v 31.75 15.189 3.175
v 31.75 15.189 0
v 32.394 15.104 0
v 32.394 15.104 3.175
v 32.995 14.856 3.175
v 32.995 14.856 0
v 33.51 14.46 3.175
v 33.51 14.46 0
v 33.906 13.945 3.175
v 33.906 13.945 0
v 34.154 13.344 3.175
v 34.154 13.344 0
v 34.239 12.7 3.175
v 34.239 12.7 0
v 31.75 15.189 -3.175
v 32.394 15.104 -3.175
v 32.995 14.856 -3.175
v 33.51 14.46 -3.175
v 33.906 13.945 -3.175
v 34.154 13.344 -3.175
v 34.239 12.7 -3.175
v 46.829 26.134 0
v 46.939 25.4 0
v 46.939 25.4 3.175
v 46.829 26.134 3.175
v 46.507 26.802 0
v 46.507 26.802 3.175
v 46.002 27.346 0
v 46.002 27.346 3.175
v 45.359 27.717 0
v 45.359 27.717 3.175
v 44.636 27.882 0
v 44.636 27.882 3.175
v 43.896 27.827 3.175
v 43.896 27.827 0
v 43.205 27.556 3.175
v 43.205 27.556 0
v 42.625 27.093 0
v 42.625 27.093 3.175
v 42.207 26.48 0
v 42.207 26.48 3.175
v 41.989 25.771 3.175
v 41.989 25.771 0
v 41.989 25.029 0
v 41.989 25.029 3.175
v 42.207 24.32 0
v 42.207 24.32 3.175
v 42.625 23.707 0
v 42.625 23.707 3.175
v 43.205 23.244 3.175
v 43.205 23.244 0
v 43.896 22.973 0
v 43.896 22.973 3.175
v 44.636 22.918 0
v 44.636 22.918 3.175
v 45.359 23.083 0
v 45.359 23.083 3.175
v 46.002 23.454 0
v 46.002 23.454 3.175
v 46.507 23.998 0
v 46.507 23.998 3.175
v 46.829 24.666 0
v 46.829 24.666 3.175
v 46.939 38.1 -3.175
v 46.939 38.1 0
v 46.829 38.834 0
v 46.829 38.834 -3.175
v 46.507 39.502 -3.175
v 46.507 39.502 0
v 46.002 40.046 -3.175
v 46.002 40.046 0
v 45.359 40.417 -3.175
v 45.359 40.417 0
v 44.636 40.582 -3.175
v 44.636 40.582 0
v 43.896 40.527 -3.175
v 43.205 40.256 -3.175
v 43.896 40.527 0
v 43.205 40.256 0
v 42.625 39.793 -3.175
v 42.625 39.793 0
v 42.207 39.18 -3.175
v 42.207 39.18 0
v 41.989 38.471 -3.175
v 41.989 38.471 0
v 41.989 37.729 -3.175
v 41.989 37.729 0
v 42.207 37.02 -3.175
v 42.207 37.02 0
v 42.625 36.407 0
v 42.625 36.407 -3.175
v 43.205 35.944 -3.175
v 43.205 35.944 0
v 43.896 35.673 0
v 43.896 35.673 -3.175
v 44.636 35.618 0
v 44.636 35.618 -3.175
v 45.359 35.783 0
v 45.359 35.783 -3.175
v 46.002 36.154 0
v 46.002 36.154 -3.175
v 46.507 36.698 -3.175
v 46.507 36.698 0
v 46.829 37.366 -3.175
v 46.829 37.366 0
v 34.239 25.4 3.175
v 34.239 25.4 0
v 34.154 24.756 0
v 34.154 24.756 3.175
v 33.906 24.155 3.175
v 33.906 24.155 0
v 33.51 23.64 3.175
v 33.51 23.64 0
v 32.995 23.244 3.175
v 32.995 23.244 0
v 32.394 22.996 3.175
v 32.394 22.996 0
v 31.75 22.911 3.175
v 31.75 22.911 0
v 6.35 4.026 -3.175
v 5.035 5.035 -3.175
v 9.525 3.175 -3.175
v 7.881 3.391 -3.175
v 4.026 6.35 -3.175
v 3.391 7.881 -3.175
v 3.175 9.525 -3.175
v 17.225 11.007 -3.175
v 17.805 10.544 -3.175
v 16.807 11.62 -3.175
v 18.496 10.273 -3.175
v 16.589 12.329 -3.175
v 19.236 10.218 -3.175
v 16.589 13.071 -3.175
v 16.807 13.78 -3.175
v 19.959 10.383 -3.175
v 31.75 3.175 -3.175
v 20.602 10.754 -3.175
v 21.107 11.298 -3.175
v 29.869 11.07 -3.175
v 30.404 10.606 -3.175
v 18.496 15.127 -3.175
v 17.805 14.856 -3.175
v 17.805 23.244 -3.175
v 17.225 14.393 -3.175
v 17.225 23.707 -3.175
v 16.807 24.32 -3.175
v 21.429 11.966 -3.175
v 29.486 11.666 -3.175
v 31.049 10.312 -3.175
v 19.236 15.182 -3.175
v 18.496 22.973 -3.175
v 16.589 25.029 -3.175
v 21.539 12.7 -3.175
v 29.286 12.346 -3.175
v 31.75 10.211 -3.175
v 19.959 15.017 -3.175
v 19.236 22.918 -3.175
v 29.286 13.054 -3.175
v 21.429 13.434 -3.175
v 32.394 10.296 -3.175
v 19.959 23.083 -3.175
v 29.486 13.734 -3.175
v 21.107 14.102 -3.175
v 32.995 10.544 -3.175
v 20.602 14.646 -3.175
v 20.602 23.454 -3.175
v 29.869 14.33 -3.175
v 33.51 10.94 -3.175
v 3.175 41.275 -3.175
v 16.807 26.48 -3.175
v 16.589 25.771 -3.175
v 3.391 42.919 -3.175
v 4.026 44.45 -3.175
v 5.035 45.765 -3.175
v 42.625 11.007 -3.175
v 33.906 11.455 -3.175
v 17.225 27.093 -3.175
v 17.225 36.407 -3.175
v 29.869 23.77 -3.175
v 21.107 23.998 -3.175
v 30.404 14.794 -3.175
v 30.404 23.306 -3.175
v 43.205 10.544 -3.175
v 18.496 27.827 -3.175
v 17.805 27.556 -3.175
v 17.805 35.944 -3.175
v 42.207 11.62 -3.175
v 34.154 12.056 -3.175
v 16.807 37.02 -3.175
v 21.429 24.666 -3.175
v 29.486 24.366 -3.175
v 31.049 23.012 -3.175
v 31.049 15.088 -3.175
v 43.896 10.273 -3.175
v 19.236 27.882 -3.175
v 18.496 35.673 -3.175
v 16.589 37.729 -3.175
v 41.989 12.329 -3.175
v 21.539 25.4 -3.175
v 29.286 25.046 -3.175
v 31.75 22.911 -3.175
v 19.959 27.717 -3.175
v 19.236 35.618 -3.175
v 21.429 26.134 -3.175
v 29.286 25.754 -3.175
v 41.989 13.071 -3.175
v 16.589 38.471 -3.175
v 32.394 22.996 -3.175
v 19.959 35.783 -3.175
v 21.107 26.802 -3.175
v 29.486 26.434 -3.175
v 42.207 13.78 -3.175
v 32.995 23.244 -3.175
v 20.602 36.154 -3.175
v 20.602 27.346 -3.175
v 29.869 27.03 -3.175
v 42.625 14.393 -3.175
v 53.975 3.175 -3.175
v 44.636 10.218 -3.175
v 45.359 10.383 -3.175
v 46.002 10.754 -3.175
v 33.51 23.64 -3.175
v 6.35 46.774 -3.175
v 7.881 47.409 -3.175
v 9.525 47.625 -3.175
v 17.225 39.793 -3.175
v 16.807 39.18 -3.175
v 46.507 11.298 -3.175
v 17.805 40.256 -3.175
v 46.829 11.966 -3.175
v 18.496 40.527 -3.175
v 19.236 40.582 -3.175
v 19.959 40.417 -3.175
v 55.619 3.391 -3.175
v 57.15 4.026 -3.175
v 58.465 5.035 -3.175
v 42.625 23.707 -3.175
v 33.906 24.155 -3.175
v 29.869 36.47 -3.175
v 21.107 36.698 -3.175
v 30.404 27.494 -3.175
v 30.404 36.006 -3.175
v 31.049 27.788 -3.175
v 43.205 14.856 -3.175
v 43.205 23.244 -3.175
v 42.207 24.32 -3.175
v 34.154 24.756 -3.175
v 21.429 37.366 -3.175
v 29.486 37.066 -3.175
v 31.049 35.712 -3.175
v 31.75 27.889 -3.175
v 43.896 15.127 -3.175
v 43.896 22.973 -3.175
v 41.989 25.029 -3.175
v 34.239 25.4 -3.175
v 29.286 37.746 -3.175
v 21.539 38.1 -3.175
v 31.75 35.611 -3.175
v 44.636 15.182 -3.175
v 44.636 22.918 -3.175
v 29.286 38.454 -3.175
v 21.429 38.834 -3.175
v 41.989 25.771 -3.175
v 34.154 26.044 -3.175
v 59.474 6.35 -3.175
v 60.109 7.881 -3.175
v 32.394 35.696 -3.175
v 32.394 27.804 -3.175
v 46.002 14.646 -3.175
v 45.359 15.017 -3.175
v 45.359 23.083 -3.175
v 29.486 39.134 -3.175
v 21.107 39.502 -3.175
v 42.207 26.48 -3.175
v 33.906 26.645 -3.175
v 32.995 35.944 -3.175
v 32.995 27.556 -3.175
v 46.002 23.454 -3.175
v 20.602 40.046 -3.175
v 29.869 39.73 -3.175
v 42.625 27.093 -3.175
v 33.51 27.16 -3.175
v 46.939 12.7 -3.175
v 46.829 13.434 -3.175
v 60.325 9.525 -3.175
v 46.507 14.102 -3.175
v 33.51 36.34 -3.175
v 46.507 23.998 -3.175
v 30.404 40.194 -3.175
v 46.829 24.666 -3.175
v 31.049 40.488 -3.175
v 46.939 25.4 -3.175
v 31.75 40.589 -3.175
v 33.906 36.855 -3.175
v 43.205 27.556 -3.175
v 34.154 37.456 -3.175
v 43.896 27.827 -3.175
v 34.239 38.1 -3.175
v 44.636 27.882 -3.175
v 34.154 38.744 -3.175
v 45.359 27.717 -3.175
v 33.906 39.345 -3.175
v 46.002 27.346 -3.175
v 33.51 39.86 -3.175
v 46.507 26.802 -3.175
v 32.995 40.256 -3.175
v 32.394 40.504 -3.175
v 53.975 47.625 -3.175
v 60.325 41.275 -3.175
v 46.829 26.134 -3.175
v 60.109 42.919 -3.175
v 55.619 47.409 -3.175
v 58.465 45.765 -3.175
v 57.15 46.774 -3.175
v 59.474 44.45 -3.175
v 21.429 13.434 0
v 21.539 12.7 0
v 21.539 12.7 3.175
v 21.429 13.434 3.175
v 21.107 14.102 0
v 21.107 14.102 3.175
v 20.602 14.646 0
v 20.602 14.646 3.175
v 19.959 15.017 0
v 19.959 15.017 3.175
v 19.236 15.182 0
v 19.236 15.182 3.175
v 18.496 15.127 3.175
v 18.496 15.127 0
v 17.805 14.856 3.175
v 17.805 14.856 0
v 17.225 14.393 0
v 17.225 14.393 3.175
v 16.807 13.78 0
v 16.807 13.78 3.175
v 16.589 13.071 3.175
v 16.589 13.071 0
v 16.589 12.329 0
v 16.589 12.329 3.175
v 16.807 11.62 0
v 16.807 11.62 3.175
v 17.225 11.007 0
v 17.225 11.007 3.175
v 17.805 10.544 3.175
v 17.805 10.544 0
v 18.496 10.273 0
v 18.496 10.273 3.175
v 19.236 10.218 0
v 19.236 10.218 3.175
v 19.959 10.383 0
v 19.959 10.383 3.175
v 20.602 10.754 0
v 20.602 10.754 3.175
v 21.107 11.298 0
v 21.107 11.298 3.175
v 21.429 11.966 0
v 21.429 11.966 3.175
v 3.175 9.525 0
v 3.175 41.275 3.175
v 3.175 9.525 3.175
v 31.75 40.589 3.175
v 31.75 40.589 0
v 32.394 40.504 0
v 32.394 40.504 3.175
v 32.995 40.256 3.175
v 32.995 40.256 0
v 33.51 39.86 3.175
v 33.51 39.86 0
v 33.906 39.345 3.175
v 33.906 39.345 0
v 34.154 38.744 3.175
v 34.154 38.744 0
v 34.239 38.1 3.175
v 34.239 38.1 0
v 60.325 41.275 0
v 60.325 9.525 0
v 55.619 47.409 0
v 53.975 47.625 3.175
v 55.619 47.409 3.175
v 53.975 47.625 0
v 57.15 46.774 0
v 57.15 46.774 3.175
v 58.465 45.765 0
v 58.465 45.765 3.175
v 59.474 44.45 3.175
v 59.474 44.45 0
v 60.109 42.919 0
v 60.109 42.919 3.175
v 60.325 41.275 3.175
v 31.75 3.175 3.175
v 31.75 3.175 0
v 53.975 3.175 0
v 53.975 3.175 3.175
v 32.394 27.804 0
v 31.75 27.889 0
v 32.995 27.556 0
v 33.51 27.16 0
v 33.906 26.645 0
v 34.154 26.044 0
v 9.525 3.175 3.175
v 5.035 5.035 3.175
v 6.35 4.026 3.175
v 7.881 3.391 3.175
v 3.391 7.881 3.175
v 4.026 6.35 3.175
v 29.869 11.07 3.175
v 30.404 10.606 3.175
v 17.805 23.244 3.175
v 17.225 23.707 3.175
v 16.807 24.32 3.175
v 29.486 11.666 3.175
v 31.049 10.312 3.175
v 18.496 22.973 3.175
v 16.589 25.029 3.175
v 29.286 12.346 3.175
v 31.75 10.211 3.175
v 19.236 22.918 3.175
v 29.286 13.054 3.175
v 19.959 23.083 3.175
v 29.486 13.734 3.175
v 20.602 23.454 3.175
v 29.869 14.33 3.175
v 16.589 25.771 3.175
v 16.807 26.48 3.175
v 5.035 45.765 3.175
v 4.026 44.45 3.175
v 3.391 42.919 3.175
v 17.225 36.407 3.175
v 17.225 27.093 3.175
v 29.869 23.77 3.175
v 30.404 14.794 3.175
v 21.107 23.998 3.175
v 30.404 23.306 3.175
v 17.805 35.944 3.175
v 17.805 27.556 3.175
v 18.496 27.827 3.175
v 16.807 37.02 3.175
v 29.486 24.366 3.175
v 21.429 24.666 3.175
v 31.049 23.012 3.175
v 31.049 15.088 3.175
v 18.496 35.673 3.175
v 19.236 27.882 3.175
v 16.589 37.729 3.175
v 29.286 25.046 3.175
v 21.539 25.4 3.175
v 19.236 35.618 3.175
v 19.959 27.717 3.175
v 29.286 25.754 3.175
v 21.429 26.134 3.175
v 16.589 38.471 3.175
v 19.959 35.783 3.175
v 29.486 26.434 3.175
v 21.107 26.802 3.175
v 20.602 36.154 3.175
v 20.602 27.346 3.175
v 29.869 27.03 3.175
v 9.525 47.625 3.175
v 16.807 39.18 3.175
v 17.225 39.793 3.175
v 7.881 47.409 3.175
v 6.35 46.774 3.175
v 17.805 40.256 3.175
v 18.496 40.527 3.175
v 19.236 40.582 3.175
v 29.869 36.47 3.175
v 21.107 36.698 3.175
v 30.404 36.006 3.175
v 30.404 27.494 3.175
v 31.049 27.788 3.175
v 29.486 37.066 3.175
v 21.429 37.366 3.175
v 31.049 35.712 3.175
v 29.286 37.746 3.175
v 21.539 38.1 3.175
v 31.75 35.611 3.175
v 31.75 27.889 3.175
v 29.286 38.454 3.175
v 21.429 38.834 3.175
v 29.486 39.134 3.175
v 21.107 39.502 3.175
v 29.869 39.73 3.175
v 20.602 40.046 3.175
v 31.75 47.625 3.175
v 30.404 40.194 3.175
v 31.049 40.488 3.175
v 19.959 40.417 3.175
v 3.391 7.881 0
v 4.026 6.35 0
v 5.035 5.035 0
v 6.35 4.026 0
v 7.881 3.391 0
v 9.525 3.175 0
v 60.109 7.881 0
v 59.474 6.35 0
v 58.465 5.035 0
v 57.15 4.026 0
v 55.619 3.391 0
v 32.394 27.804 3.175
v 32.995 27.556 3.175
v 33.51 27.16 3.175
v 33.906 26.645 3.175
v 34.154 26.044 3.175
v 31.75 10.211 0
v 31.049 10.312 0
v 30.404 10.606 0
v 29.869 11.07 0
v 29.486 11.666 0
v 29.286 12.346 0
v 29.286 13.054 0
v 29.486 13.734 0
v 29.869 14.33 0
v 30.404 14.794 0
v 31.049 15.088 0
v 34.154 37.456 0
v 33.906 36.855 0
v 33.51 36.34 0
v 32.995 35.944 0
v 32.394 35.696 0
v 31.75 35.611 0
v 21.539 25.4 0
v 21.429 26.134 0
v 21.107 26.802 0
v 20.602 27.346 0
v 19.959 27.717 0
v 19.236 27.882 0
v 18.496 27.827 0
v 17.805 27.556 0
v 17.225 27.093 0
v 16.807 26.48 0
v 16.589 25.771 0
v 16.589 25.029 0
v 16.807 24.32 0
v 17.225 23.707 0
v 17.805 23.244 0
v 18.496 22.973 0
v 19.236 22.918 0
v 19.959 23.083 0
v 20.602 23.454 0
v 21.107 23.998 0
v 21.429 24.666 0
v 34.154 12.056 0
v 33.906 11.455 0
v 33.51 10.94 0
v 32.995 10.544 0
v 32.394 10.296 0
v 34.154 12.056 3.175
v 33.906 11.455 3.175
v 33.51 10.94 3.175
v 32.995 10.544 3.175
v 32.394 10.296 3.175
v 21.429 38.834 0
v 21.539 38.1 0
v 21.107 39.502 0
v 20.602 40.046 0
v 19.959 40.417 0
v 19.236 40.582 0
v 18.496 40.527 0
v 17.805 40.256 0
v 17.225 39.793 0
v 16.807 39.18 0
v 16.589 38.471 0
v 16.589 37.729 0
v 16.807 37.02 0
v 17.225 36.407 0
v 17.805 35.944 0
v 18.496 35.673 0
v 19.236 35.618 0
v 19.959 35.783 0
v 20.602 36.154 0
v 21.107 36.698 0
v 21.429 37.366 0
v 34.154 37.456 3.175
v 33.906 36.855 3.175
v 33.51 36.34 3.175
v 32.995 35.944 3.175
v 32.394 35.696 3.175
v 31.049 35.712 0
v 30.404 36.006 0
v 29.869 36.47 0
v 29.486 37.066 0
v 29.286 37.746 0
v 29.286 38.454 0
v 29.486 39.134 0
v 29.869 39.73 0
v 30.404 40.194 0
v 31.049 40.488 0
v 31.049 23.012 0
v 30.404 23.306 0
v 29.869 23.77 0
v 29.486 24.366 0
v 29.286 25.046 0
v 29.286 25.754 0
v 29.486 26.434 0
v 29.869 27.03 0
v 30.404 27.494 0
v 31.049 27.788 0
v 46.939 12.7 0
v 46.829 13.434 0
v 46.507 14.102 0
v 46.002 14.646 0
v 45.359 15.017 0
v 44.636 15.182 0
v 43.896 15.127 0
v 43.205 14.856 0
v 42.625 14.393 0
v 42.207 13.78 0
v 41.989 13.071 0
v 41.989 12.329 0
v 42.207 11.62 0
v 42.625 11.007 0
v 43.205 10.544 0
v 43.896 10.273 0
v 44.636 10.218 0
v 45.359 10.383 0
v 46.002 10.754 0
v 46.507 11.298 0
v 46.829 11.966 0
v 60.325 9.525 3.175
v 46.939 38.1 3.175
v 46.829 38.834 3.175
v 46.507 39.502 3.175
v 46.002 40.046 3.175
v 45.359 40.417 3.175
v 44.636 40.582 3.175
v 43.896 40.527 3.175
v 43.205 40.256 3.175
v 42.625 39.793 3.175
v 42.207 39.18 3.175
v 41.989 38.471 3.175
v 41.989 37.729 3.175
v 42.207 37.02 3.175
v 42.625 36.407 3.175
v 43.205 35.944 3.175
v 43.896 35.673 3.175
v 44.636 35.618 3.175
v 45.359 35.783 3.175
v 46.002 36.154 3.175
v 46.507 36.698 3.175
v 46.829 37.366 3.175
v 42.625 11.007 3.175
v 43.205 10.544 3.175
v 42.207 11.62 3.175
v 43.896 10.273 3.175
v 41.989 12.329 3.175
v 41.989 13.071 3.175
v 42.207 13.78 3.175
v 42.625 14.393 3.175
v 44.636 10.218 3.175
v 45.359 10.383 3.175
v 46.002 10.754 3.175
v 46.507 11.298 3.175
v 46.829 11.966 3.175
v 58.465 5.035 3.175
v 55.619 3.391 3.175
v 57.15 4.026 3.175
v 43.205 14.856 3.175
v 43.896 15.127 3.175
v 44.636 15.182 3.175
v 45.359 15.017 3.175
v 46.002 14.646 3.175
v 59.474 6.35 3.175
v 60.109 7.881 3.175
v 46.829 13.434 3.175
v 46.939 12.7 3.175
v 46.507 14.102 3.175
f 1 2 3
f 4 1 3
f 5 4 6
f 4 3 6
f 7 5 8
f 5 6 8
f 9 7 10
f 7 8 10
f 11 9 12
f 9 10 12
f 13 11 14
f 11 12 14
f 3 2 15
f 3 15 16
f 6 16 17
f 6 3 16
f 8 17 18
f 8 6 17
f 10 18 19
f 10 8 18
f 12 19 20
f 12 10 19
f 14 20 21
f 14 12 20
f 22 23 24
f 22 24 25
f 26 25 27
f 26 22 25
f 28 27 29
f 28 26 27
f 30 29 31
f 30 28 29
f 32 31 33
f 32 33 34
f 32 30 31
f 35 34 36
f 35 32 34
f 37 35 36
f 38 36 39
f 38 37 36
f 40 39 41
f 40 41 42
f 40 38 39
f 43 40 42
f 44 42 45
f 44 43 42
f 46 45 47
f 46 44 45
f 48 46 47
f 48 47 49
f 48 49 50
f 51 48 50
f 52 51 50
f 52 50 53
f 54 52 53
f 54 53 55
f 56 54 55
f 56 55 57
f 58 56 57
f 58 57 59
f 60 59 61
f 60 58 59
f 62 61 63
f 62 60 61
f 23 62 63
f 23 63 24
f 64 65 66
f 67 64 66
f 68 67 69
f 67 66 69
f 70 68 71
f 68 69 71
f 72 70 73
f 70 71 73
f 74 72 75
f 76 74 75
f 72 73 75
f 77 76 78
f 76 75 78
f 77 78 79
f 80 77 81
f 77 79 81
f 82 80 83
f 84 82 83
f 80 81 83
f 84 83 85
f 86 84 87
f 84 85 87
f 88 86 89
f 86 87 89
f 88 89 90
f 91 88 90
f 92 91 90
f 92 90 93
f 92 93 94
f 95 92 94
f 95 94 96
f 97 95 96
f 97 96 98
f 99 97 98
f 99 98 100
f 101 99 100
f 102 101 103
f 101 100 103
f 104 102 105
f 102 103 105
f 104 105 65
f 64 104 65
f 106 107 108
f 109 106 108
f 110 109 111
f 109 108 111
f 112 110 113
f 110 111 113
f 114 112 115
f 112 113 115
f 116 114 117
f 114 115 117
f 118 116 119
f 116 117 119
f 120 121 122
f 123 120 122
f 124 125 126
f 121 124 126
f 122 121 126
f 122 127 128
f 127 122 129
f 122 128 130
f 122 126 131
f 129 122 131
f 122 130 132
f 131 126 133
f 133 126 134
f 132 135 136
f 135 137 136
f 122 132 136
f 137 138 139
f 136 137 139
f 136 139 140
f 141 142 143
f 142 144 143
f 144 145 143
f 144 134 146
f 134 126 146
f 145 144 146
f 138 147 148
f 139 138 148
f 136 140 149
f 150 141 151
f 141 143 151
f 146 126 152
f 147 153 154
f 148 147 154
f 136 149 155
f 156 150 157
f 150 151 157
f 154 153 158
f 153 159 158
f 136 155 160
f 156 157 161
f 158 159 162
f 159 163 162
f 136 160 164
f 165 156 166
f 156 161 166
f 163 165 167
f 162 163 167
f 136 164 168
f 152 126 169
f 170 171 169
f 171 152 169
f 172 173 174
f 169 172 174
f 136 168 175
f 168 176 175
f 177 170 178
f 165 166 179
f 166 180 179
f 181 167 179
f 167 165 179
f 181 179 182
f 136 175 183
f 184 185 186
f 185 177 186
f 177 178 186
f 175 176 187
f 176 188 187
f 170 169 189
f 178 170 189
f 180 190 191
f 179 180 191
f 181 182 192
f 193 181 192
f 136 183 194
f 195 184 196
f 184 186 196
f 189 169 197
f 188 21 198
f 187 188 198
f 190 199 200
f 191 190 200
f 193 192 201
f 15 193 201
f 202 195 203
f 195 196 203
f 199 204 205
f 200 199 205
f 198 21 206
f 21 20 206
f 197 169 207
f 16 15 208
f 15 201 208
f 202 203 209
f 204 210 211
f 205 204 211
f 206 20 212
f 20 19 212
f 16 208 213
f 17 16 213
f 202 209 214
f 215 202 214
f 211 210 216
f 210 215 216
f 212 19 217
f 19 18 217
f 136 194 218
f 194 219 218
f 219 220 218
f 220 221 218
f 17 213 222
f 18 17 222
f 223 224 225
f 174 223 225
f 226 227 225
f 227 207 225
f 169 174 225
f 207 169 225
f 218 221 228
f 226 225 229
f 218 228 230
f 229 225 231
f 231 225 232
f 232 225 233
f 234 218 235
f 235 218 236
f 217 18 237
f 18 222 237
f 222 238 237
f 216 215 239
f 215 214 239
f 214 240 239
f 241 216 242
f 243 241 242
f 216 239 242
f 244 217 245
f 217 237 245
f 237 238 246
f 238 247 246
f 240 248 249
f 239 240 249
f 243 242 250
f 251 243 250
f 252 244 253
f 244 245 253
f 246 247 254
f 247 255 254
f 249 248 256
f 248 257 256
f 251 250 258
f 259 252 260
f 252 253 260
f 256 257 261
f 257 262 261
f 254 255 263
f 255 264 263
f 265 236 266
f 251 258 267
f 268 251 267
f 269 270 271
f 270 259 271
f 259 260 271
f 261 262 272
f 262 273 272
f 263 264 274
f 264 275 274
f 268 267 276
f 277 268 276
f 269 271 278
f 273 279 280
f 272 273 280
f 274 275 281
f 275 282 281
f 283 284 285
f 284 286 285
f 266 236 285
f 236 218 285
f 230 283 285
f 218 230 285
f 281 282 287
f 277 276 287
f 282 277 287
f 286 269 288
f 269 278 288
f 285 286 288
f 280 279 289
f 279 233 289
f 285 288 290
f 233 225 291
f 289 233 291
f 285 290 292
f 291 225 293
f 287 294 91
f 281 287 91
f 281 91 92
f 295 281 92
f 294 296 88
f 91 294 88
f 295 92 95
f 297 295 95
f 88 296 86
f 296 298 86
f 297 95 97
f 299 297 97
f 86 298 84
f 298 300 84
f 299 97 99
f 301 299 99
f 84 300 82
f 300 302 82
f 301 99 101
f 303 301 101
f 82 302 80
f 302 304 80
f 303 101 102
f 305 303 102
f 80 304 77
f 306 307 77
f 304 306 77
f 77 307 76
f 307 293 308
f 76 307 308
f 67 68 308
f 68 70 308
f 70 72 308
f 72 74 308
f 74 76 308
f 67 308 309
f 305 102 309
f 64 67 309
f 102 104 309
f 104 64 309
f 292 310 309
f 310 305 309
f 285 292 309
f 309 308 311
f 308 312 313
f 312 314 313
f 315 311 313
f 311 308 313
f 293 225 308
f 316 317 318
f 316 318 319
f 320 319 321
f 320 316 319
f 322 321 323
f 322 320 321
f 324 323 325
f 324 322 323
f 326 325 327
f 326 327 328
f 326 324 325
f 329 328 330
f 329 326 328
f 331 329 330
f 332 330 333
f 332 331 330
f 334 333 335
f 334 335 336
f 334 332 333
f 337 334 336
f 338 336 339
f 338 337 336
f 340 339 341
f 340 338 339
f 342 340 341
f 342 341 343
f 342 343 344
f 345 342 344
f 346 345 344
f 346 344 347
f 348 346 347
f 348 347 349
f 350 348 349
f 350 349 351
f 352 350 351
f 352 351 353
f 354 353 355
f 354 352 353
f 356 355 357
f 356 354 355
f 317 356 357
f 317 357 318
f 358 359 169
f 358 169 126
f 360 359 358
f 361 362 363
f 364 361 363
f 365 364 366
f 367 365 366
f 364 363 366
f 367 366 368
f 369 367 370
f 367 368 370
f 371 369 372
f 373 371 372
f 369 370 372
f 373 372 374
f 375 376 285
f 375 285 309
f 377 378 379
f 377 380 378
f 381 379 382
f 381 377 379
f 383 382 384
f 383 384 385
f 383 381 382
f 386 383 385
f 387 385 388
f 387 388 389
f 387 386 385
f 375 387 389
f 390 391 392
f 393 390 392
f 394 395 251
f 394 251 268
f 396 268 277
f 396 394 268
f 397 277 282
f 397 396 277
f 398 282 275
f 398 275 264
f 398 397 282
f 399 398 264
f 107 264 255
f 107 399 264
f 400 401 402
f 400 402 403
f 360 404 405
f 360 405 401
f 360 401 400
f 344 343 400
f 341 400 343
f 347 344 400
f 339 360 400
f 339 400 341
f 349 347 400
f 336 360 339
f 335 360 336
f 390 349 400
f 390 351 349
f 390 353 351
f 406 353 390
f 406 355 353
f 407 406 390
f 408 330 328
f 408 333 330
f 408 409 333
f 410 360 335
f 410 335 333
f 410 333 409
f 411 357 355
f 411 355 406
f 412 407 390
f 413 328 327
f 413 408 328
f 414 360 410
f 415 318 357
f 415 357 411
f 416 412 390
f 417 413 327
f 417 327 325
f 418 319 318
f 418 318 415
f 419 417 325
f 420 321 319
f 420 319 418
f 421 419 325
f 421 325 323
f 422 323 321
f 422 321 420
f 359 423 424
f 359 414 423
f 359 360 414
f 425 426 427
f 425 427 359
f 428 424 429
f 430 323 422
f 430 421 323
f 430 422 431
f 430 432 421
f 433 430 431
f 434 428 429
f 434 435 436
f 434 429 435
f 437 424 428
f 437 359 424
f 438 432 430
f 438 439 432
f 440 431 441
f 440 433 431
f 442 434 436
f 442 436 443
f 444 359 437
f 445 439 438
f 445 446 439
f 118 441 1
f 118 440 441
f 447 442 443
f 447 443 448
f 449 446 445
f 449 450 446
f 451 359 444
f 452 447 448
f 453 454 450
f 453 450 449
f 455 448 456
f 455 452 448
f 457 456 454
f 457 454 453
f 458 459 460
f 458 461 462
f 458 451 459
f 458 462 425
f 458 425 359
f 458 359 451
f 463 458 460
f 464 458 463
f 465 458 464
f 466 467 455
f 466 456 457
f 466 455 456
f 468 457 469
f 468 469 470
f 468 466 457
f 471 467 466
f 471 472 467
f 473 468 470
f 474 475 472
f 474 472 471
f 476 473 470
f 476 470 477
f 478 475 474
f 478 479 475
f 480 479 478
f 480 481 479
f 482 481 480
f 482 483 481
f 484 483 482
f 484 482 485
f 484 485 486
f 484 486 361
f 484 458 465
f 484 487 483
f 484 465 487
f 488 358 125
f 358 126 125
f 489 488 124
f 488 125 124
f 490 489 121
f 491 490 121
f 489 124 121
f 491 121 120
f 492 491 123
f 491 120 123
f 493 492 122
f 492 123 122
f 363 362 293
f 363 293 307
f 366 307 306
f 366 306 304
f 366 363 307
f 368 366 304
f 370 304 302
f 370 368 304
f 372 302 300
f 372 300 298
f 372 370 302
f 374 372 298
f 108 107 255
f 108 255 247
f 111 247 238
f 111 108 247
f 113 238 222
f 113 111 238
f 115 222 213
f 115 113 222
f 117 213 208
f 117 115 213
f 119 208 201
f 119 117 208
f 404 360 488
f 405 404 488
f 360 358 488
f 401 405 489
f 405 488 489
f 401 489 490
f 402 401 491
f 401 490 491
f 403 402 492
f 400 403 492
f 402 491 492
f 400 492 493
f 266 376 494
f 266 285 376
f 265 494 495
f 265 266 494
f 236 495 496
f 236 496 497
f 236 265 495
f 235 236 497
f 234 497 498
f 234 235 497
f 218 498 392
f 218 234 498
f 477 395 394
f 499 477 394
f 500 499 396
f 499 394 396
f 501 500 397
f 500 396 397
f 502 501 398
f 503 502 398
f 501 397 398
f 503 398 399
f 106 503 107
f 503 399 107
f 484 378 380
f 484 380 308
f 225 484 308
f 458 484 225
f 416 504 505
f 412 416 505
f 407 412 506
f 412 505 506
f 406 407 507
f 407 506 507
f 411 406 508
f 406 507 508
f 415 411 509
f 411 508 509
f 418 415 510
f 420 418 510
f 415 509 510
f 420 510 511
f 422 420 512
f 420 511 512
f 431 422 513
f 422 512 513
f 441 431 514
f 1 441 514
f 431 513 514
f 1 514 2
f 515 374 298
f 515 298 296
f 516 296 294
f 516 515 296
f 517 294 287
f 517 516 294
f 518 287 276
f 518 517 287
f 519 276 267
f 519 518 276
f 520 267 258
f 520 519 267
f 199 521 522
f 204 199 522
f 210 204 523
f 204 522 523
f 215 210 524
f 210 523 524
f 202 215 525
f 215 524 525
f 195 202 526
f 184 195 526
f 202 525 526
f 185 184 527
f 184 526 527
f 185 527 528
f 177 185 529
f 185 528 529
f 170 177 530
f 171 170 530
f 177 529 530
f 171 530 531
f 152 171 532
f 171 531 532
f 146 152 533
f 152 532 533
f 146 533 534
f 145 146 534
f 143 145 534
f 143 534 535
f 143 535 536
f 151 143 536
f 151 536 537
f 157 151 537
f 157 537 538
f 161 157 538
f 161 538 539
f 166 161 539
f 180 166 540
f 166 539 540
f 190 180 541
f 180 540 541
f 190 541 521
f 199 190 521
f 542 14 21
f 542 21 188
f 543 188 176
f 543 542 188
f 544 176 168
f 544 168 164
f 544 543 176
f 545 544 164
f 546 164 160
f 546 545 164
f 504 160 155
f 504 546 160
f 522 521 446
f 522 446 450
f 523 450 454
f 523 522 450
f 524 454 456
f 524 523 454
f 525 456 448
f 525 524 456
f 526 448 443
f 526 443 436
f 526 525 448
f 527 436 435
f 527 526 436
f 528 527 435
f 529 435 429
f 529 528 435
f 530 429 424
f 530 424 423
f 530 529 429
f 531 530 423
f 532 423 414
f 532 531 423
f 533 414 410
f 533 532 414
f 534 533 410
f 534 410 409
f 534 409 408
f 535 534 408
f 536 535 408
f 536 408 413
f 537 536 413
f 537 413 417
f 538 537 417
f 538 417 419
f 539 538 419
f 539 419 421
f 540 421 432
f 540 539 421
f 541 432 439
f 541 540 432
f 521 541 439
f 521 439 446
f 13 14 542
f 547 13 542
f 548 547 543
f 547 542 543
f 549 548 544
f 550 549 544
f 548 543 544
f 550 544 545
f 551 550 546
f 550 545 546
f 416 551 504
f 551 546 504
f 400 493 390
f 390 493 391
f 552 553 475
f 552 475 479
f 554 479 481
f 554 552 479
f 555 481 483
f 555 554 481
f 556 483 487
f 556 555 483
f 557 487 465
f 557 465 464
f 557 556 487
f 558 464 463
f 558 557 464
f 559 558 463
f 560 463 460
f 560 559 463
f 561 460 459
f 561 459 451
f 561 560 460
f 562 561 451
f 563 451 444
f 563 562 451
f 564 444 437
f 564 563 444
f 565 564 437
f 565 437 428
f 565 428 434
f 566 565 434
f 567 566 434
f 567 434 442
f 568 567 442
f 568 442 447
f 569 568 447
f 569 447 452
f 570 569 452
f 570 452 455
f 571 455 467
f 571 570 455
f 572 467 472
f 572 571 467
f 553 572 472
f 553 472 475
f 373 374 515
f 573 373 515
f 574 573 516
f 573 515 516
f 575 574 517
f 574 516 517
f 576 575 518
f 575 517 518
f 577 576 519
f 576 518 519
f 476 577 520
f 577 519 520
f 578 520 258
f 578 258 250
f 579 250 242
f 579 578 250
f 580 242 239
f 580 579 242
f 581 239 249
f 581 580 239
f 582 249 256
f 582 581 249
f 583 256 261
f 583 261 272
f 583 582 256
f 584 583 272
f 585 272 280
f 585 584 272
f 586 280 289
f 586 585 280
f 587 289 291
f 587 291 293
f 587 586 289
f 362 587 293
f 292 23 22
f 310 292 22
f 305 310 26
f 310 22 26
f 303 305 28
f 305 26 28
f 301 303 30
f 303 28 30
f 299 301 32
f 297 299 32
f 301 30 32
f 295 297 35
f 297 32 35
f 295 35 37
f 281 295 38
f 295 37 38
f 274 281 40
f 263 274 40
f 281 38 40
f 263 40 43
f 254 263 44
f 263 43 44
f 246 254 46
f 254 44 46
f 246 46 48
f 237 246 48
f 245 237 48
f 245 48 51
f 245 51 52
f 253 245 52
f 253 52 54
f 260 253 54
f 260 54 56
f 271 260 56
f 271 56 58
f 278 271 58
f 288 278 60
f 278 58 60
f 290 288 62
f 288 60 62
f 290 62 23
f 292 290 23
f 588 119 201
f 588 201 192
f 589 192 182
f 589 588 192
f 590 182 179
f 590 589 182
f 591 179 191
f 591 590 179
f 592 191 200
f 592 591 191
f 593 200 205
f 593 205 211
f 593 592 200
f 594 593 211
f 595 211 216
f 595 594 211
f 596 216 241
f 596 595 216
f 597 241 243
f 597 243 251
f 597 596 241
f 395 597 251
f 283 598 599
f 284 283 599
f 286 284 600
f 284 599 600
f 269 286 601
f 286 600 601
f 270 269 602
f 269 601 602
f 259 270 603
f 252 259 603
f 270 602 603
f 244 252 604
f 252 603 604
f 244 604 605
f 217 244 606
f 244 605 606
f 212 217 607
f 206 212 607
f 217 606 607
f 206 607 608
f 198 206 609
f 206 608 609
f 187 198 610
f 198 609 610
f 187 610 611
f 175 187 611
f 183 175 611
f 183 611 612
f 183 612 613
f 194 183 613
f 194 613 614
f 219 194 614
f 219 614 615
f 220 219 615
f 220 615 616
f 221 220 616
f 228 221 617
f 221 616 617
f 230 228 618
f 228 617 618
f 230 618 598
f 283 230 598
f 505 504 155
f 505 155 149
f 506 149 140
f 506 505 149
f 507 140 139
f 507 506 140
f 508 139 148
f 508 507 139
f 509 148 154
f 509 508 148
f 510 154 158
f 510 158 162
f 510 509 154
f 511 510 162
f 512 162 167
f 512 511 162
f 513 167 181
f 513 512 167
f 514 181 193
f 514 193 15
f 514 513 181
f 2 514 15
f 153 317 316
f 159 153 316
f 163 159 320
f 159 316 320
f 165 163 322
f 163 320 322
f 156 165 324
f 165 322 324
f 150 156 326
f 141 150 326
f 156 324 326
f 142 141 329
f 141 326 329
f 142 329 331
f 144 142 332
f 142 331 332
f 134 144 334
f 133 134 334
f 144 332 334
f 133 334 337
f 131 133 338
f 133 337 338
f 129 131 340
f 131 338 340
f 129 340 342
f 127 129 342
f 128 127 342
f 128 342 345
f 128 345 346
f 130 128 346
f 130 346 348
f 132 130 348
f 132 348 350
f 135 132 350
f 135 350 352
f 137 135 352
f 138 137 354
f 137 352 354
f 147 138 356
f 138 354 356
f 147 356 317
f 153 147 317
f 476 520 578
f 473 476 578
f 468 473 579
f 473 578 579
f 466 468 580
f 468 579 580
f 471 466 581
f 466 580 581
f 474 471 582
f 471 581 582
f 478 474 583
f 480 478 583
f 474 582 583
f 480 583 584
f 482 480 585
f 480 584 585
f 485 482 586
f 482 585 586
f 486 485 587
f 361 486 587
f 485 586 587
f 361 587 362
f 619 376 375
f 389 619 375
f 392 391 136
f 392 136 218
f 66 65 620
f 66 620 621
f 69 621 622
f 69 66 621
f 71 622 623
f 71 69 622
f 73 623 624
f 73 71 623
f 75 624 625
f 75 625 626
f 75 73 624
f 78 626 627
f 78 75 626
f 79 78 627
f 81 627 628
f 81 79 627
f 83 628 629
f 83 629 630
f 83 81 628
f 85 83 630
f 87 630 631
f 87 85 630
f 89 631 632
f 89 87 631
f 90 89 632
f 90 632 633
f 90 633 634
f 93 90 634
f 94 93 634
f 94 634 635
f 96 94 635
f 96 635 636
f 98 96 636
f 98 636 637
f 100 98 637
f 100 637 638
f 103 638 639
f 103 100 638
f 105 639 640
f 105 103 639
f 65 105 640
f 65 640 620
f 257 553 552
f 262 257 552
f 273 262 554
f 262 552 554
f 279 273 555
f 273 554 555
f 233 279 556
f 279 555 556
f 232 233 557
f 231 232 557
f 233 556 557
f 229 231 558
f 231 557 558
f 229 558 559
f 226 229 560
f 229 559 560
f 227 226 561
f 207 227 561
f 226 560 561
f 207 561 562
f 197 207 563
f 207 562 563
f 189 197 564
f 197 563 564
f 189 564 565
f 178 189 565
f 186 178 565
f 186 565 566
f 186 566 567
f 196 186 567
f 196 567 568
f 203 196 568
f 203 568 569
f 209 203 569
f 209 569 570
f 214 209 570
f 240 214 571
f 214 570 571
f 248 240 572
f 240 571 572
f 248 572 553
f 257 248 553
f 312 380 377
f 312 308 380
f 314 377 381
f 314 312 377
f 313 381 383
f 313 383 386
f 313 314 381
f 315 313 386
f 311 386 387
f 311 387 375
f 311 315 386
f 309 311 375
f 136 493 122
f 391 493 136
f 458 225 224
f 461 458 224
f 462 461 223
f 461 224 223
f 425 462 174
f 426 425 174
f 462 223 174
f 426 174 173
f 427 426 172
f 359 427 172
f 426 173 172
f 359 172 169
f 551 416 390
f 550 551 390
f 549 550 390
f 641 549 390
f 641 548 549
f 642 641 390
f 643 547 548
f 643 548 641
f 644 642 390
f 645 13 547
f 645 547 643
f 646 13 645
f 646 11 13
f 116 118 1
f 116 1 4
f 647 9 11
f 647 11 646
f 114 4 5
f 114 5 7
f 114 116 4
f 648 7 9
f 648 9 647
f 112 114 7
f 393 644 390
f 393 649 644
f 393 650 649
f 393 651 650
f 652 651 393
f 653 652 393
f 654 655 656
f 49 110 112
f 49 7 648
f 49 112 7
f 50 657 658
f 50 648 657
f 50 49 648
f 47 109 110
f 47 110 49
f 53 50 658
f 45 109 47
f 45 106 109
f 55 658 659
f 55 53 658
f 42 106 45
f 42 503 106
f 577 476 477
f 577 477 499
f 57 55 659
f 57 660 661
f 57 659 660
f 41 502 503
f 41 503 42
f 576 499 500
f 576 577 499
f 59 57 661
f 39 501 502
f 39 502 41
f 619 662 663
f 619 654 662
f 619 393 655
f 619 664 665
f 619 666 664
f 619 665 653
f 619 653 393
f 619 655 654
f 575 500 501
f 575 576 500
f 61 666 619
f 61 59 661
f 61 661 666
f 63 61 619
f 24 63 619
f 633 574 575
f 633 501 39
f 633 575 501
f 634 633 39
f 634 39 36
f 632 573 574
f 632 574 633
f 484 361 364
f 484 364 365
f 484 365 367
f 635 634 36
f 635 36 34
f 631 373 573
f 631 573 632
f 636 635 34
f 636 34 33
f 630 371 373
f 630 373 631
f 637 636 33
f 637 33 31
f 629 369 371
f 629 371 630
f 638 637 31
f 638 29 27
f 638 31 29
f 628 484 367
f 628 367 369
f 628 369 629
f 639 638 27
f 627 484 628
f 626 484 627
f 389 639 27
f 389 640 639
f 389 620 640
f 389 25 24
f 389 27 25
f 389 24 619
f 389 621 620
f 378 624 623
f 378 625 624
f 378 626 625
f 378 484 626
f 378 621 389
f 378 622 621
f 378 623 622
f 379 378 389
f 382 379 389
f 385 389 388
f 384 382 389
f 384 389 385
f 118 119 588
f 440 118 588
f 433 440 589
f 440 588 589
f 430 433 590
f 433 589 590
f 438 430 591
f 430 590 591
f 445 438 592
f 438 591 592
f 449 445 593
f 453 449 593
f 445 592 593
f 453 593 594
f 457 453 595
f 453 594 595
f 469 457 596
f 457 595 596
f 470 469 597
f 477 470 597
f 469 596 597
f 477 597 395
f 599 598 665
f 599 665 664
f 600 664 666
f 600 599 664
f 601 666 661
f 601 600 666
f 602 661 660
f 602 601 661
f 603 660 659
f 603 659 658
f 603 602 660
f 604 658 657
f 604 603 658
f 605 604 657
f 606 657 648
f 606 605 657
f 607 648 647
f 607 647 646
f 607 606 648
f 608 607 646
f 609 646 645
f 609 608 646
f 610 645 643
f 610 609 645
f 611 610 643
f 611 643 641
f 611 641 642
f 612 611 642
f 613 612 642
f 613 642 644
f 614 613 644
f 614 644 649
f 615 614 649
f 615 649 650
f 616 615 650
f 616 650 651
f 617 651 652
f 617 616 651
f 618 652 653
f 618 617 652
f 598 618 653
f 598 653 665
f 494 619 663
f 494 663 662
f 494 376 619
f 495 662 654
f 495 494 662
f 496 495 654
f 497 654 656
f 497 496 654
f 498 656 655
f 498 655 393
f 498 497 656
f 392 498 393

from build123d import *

# Parameters (mm, degrees)
SKETCH1_R           = 2.4892
BOSS_EXTRUDE1_DEPTH = 3.175
FILLET1_R           = 6.35


with BuildPart() as part:
    # Sketch1 → Boss-Extrude1 (new, symmetric)
    # profile 1 of 2: a face of its own
    with BuildSketch(Plane.XY):
        with BuildLine():
            Line((60.325, 47.625), (31.75, 47.625))
            Line((31.75, 47.625), (31.75, 40.5892))
            ThreePointArc((31.75, 40.5892), (33.5101302, 39.8601302), (34.2392, 38.1))
            ThreePointArc((34.2392, 38.1), (33.5101302, 36.3398698), (31.75, 35.6108))
            Line((31.75, 35.6108), (31.75, 27.8892))
            ThreePointArc((31.75, 27.8892), (33.5101302, 27.1601302), (34.2392, 25.4))
            ThreePointArc((34.2392, 25.4), (33.5101302, 23.6398698), (31.75, 22.9108))
            Line((31.75, 22.9108), (31.75, 15.1892))
            ThreePointArc((31.75, 15.1892), (33.5101302, 14.4601302), (34.2392, 12.7))
            ThreePointArc((34.2392, 12.7), (33.5101302, 10.9398698), (31.75, 10.2108))
            Line((31.75, 10.2108), (31.75, 3.175))
            Line((31.75, 3.175), (60.325, 3.175))
            Line((60.325, 3.175), (60.325, 47.625))
        make_face()
        with Locations((44.45, 12.7)):
            Circle(SKETCH1_R, mode=Mode.SUBTRACT)
        with Locations((44.45, 25.4)):
            Circle(SKETCH1_R, mode=Mode.SUBTRACT)
        with Locations((44.45, 38.1)):
            Circle(SKETCH1_R, mode=Mode.SUBTRACT)
    # profile 2 of 2: a face of its own
    with BuildSketch(Plane.XY):
        with BuildLine():
            Line((31.75, 40.5892), (31.75, 47.625))
            Line((31.75, 47.625), (3.175, 47.625))
            Line((3.175, 47.625), (3.175, 3.175))
            Line((3.175, 3.175), (31.75, 3.175))
            Line((31.75, 3.175), (31.75, 10.2108))
            ThreePointArc((31.75, 10.2108), (29.2608, 12.7), (31.75, 15.1892))
            Line((31.75, 15.1892), (31.75, 22.9108))
            ThreePointArc((31.75, 22.9108), (29.2608, 25.4), (31.75, 27.8892))
            Line((31.75, 27.8892), (31.75, 35.6108))
            ThreePointArc((31.75, 35.6108), (29.2608, 38.1), (31.75, 40.5892))
        make_face()
        with Locations((19.05, 12.7)):
            Circle(SKETCH1_R, mode=Mode.SUBTRACT)
        with Locations((19.05, 25.4)):
            Circle(SKETCH1_R, mode=Mode.SUBTRACT)
        with Locations((19.05, 38.1)):
            Circle(SKETCH1_R, mode=Mode.SUBTRACT)
    extrude(amount=BOSS_EXTRUDE1_DEPTH, both=True)

    # Fillet1
    fillet1_edges = [part.edges().sort_by_distance(p)[0] for p in [
        (60.325, 47.625, 0),
        (60.325, 3.175, 0),
        (3.175, 3.175, 0),
        (3.175, 47.625, 0),
    ]]
    fillet(fillet1_edges, radius=FILLET1_R)


solid = part.part
